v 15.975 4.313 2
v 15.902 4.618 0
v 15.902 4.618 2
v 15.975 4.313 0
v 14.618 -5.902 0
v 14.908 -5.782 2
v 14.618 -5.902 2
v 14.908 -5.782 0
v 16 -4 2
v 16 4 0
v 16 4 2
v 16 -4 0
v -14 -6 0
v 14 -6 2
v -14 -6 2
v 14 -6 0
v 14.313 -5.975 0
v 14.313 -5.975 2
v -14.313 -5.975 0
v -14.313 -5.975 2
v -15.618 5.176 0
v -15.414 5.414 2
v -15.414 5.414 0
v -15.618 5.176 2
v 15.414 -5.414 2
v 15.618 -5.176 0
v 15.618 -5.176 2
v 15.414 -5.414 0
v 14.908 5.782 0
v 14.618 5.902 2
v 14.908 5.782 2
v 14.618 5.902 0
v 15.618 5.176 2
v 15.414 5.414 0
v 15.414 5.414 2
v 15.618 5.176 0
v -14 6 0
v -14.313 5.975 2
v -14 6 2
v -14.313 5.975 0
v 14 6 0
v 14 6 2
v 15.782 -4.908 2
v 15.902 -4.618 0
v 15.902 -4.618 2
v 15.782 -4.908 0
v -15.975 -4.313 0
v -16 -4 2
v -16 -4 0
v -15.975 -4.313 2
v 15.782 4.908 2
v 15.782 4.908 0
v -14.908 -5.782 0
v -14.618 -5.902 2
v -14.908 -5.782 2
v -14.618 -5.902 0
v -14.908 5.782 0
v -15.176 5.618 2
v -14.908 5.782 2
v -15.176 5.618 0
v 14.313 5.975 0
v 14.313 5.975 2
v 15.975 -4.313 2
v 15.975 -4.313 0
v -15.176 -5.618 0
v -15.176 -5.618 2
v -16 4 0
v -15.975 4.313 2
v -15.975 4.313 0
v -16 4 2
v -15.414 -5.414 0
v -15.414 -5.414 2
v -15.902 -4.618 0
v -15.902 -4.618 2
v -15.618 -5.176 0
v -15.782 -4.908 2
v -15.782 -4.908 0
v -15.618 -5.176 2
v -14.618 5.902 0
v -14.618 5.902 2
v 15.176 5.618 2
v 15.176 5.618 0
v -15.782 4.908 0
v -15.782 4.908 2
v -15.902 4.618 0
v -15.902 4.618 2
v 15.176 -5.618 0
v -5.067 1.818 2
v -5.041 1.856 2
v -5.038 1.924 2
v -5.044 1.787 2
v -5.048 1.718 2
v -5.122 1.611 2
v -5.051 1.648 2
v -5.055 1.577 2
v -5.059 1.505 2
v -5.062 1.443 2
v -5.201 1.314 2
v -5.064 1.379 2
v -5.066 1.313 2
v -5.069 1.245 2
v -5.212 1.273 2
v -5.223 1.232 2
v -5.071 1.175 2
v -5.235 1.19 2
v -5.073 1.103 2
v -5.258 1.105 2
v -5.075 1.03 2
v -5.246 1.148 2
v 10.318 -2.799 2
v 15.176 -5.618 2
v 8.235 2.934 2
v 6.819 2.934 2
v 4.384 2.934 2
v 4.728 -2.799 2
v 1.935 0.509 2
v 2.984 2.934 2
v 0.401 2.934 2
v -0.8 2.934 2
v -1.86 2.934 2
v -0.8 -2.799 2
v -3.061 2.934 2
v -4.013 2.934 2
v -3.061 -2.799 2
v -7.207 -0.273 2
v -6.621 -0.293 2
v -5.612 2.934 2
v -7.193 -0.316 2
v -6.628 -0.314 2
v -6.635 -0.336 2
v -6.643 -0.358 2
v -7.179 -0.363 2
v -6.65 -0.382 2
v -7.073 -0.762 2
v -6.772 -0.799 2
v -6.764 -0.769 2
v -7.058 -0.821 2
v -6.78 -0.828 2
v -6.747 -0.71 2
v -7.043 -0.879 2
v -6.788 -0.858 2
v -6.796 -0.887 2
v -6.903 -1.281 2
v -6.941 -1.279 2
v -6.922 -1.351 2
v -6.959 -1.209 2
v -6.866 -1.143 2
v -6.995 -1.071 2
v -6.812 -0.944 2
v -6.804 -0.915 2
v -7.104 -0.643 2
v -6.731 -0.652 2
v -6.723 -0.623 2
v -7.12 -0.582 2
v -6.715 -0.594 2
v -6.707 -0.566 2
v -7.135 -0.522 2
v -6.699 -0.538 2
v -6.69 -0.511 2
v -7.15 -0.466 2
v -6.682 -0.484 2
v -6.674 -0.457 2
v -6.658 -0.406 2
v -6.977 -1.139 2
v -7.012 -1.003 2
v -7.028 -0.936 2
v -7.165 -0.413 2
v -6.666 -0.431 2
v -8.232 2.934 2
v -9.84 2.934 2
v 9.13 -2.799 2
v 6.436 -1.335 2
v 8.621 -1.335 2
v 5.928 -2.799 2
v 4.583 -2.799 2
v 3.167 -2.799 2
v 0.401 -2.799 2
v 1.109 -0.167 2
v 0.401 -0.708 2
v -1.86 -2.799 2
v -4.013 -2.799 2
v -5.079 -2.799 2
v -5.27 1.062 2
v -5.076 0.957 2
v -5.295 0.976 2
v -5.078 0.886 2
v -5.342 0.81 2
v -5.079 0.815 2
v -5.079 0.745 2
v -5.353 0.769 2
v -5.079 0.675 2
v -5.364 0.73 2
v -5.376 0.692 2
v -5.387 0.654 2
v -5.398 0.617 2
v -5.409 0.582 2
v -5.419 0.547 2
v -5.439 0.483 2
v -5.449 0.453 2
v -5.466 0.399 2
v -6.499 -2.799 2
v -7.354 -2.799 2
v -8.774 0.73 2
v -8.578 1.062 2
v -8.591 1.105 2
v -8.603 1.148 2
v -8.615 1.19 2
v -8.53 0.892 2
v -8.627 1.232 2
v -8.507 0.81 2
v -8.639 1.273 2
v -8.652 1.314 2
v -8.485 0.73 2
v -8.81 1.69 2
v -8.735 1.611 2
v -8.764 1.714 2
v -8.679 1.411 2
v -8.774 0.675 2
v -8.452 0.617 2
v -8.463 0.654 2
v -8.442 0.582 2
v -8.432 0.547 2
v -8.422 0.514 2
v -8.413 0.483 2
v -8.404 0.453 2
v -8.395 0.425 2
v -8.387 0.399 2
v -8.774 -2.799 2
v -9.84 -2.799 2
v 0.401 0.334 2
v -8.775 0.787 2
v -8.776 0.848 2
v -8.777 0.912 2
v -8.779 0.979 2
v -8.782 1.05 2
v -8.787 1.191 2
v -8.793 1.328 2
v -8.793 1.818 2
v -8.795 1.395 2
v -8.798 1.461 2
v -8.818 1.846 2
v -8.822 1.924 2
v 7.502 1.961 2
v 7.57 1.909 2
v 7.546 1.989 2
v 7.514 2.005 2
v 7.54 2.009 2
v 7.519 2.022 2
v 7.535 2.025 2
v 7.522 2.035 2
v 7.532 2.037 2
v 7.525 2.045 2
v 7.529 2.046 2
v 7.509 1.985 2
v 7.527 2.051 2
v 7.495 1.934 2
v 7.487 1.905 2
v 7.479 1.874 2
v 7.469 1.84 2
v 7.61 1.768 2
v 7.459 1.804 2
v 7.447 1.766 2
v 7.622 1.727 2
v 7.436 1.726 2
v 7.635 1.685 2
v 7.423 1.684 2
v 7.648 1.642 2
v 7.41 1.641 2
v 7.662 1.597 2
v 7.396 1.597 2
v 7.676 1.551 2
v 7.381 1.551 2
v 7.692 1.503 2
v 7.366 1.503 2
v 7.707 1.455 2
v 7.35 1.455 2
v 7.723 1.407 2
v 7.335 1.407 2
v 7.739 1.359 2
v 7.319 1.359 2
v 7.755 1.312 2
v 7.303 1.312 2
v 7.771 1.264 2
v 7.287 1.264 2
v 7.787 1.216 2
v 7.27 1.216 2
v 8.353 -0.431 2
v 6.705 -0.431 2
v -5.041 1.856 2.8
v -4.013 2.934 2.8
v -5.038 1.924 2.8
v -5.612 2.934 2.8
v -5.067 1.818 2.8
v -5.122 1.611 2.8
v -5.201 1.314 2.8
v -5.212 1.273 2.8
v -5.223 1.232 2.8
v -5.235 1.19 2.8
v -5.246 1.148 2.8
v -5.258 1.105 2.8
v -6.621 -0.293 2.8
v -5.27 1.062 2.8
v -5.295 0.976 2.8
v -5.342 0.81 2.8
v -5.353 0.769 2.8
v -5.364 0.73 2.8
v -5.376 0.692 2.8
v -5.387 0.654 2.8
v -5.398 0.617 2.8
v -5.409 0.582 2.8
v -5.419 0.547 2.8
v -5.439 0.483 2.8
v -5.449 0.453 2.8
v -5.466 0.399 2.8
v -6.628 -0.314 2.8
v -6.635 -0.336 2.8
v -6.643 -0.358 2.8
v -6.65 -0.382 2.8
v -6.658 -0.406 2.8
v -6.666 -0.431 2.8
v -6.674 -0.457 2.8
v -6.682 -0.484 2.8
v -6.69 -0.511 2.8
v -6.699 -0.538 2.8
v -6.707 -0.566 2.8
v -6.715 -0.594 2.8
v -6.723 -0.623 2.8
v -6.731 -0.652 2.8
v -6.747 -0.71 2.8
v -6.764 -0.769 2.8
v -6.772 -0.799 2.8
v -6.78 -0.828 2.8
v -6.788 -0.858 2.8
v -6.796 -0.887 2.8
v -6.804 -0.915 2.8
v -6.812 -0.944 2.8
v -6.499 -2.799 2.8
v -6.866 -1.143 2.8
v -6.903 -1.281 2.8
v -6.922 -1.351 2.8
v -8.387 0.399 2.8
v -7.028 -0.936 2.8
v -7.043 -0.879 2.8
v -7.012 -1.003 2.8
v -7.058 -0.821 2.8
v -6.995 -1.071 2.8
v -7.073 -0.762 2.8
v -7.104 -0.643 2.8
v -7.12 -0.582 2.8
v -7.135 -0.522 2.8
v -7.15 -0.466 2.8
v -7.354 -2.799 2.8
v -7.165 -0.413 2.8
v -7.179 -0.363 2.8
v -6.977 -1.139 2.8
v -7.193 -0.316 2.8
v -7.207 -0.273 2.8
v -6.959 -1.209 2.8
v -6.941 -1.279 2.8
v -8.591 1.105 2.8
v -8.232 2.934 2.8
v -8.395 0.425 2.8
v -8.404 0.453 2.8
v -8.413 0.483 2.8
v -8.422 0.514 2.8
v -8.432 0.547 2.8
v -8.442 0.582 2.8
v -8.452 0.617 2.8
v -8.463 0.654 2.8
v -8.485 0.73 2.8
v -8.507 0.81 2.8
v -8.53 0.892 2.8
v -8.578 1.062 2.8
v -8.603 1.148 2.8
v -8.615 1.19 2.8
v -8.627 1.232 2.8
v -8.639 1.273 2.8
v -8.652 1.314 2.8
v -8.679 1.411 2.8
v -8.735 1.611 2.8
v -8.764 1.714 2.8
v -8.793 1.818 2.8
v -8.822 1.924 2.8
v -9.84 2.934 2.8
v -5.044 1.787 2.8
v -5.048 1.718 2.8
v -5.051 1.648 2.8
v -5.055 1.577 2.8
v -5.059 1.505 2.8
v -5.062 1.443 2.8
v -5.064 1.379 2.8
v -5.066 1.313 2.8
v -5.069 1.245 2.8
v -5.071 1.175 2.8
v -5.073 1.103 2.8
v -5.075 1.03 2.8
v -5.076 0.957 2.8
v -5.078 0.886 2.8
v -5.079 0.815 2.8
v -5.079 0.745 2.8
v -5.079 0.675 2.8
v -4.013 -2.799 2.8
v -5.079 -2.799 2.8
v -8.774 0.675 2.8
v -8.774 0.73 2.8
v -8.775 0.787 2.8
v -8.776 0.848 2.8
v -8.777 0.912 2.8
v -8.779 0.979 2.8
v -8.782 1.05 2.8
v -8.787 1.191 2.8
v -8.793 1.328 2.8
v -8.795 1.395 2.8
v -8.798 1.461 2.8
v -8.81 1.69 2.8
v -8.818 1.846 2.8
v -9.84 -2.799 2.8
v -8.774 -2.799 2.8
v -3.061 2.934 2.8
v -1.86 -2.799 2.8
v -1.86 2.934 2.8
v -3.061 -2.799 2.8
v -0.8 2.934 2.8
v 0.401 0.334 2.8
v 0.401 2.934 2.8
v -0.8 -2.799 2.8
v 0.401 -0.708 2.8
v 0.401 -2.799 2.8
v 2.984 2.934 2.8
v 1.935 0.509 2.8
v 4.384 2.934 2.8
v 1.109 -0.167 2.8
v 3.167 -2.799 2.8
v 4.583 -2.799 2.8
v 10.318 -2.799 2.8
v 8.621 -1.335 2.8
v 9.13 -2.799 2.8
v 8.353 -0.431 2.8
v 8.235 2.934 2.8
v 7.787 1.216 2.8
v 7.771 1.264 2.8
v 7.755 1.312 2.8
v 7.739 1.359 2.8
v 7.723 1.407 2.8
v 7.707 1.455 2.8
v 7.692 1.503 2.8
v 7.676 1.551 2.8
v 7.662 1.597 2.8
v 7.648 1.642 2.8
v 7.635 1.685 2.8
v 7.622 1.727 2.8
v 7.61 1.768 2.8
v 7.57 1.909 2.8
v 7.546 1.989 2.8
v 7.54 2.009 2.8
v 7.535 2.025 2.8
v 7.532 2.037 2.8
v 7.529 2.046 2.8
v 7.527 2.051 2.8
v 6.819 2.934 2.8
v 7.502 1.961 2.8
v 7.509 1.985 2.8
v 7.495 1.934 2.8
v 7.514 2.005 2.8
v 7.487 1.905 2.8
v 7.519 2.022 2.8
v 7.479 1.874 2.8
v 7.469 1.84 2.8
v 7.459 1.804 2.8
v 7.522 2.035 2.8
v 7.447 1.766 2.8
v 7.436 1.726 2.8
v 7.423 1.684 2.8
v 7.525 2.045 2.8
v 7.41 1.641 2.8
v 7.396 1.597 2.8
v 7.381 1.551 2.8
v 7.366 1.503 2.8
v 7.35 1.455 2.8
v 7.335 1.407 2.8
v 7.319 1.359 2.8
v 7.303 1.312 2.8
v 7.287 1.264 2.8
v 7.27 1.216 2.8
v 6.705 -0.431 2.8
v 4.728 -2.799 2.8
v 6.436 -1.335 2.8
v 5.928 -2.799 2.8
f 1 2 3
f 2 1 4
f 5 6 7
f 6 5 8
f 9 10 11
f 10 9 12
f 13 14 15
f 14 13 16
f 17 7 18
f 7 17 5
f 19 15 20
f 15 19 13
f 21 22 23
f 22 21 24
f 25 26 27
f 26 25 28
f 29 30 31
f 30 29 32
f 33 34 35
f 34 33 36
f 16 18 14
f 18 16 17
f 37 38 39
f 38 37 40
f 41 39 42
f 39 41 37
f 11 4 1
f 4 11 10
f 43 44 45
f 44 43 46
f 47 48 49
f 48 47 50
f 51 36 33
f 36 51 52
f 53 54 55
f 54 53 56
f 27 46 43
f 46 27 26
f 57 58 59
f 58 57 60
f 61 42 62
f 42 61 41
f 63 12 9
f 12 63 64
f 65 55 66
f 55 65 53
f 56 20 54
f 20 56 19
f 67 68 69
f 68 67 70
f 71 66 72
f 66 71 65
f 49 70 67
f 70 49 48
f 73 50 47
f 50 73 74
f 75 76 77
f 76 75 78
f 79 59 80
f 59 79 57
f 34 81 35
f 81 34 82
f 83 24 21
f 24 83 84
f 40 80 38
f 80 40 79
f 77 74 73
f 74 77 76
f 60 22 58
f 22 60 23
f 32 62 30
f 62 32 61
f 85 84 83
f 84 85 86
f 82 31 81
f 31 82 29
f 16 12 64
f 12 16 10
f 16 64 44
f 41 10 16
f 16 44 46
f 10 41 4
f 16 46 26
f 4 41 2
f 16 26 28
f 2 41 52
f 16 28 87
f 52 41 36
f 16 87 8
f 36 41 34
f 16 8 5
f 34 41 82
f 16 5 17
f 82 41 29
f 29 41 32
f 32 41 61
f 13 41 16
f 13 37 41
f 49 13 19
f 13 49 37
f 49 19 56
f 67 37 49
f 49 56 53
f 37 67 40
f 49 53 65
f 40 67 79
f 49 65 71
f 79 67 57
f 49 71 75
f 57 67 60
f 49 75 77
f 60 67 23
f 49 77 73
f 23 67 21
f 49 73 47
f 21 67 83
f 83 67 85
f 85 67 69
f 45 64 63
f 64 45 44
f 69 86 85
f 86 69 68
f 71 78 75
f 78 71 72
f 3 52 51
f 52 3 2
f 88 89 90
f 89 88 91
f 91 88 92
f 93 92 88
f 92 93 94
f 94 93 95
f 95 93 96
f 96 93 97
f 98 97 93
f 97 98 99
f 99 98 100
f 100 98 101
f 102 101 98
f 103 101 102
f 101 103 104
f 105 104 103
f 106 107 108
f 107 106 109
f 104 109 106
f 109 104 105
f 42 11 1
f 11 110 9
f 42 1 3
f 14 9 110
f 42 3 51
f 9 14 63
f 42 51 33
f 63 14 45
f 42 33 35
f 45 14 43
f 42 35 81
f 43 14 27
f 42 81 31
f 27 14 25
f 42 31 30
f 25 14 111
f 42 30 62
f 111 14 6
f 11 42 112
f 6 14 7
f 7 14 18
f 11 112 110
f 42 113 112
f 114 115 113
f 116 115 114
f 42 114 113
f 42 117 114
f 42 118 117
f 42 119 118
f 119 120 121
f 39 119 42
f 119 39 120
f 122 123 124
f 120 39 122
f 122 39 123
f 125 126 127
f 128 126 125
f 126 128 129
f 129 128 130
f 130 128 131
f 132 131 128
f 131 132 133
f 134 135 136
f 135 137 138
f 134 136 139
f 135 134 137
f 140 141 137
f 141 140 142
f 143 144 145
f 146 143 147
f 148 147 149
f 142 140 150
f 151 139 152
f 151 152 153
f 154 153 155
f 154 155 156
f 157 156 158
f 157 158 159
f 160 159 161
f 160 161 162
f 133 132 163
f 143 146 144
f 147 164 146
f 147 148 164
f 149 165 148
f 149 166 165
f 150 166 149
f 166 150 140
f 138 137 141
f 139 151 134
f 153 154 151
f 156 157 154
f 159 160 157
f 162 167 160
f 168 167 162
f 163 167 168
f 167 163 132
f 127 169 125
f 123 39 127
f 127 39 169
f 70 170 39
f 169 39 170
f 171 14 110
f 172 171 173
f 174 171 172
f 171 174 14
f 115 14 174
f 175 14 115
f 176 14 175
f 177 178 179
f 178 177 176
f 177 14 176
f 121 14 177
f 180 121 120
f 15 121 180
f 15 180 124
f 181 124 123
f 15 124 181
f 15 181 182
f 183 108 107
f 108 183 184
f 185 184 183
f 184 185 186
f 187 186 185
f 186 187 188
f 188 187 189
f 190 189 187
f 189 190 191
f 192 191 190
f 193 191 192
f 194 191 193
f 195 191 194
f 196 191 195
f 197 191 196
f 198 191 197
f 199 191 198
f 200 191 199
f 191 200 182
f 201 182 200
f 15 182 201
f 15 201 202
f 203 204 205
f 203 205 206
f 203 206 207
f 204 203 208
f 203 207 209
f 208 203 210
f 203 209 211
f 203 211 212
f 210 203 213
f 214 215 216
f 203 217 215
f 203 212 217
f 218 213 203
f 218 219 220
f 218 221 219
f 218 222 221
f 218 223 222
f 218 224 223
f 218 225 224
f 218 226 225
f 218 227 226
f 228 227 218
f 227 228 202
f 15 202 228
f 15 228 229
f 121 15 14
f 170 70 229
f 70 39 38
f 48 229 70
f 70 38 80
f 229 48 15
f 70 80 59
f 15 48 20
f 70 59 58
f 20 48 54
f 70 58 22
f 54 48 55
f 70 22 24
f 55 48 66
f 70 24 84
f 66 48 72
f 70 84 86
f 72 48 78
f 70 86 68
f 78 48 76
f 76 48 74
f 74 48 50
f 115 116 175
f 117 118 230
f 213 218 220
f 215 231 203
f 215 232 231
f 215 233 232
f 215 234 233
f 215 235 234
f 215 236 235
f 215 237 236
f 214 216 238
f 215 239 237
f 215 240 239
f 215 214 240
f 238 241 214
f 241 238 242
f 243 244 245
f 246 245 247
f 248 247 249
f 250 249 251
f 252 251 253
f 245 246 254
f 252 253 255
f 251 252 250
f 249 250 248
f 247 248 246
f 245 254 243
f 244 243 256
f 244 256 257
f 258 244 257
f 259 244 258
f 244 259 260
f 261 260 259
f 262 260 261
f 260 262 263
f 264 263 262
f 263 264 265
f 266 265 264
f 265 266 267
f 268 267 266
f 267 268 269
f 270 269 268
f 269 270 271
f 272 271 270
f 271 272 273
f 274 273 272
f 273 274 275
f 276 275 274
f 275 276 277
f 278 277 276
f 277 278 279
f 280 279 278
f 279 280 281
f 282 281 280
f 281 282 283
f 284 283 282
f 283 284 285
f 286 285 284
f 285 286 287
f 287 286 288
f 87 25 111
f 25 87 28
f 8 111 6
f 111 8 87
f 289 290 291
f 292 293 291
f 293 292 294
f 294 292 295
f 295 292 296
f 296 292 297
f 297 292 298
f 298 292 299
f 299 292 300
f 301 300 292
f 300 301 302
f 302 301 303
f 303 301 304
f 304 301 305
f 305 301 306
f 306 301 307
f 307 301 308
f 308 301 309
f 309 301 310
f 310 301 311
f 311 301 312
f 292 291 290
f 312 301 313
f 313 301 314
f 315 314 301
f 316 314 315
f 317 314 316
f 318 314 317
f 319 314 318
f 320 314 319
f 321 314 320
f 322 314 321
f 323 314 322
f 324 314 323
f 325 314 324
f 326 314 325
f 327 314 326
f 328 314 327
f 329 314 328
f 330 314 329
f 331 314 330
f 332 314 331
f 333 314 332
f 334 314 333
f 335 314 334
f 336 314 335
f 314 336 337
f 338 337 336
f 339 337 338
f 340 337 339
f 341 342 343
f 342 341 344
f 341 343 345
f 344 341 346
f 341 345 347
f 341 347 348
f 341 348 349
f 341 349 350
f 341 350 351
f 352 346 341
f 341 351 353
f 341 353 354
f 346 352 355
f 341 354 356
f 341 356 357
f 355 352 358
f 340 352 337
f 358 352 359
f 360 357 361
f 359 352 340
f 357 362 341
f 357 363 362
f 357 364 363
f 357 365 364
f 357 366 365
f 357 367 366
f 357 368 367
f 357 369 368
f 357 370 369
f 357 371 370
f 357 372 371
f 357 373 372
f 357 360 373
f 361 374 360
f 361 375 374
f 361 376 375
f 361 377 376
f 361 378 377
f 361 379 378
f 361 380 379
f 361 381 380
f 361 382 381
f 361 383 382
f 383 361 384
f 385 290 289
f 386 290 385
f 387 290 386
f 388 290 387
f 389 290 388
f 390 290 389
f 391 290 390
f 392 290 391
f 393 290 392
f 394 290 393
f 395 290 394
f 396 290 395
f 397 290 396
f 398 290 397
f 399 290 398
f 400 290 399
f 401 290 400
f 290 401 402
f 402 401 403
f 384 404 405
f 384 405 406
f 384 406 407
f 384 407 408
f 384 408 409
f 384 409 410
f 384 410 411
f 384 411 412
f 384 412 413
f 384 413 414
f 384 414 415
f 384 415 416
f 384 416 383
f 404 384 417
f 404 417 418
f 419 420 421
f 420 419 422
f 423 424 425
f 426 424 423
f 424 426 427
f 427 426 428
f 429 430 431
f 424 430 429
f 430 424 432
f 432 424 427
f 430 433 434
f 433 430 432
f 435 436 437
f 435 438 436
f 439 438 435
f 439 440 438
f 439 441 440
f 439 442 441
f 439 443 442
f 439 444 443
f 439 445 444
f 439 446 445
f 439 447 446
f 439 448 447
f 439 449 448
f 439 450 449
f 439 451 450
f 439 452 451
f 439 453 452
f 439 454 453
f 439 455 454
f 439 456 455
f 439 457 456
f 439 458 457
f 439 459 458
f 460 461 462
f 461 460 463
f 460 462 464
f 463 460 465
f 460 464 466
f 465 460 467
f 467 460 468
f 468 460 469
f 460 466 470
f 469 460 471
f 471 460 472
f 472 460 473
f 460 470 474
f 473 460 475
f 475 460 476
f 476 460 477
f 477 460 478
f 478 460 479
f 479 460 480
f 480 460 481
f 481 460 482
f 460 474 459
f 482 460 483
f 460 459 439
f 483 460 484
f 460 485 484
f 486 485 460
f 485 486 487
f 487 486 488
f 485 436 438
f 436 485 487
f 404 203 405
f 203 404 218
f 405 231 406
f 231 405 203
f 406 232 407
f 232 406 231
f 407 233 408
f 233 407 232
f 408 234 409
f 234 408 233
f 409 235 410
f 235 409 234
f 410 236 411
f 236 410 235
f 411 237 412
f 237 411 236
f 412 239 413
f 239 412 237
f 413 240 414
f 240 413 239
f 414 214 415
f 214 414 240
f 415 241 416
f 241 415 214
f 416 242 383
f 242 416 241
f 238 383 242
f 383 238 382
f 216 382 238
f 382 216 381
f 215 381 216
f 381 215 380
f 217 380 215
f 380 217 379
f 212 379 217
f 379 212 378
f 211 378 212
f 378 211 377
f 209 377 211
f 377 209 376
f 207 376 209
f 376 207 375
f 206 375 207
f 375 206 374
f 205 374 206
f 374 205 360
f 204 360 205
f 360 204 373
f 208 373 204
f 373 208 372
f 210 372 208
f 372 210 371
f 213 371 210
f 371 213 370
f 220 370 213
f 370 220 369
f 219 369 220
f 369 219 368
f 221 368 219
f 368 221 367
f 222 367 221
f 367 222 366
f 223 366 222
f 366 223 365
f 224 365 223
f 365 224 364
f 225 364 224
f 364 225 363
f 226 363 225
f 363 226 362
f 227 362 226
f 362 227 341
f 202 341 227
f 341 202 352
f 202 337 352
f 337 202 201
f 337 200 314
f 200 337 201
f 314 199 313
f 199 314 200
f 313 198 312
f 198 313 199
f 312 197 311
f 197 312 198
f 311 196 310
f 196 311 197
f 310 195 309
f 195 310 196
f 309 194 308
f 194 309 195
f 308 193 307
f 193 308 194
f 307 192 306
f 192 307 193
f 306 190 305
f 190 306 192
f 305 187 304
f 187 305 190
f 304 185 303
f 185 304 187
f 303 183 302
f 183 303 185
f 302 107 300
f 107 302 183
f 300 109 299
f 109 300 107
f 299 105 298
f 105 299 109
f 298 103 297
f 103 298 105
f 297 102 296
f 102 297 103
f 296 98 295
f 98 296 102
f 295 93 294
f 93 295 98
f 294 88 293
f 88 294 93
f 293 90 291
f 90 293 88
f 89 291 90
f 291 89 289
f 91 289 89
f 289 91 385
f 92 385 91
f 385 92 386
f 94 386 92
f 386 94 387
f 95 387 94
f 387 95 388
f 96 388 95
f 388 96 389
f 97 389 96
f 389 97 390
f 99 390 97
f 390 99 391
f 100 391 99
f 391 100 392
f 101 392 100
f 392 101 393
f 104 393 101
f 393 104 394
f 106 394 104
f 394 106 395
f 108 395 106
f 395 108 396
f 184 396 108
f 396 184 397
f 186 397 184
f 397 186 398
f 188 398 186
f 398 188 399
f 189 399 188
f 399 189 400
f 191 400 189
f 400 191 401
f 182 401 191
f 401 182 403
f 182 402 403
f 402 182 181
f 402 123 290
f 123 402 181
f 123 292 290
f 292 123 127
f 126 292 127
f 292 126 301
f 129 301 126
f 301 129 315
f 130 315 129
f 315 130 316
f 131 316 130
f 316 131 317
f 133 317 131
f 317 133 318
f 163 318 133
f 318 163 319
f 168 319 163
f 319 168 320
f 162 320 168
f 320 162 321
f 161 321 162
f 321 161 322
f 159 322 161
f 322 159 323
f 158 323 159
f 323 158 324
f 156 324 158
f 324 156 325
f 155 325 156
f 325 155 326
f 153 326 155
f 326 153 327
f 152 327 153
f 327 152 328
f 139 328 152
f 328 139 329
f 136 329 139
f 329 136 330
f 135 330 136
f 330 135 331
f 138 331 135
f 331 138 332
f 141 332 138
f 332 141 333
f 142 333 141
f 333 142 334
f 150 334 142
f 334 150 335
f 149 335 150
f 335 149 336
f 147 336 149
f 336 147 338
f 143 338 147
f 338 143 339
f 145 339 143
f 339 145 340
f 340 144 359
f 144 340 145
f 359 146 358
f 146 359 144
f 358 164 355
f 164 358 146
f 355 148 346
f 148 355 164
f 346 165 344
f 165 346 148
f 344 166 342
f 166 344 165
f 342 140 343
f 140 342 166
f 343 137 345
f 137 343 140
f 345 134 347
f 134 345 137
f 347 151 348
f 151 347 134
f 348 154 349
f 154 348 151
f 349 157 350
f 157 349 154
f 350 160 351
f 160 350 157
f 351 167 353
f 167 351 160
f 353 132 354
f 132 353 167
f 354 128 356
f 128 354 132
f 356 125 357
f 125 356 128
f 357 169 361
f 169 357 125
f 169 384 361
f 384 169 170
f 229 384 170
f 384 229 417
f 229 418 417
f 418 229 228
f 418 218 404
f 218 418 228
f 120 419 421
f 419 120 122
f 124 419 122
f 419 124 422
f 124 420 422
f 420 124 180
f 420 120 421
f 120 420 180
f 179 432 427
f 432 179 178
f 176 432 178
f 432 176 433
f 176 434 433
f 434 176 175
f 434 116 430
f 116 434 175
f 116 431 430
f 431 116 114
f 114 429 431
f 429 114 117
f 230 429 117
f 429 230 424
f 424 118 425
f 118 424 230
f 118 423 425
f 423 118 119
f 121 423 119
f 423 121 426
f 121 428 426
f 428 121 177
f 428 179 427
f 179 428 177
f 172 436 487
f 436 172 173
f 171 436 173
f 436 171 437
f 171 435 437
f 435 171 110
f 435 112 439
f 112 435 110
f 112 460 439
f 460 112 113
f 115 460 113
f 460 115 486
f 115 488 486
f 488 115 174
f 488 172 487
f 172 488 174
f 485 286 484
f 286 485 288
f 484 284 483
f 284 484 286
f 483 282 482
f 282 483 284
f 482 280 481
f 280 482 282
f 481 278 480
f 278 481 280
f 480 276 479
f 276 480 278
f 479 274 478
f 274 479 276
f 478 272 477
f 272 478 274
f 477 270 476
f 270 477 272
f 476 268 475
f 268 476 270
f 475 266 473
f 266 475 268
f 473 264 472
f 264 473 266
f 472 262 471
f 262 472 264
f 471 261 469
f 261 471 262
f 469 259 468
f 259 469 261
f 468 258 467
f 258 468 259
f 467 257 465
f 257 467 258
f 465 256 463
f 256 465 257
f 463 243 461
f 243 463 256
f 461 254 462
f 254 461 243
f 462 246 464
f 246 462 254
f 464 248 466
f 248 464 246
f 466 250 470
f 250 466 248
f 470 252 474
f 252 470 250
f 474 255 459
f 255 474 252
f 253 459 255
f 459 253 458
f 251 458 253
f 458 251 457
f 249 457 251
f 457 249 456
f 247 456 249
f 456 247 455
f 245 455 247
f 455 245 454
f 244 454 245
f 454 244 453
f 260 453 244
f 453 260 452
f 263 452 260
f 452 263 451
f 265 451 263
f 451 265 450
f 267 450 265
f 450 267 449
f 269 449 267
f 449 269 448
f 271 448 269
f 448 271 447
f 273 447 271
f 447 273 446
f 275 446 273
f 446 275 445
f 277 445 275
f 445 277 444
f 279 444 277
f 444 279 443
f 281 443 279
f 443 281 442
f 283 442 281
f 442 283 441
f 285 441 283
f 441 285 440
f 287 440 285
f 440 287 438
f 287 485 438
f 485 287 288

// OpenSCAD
// Course accessory, dimensions in mm. Do not scale the original shell to fit it.
pet_name = "MIKA";
plate_w = 32;
plate_h = 12;
plate_t = 2;
letter_h = 0.8;
font_size = 6;
$fn = 40;
linear_extrude(plate_t)
    offset(r=2) square([plate_w-4, plate_h-4], center=true);
translate([0,0,plate_t-0.05])
    linear_extrude(letter_h+0.05)
        text(pet_name, size=font_size, halign="center", valign="center", font="Liberation Sans:style=Bold");
